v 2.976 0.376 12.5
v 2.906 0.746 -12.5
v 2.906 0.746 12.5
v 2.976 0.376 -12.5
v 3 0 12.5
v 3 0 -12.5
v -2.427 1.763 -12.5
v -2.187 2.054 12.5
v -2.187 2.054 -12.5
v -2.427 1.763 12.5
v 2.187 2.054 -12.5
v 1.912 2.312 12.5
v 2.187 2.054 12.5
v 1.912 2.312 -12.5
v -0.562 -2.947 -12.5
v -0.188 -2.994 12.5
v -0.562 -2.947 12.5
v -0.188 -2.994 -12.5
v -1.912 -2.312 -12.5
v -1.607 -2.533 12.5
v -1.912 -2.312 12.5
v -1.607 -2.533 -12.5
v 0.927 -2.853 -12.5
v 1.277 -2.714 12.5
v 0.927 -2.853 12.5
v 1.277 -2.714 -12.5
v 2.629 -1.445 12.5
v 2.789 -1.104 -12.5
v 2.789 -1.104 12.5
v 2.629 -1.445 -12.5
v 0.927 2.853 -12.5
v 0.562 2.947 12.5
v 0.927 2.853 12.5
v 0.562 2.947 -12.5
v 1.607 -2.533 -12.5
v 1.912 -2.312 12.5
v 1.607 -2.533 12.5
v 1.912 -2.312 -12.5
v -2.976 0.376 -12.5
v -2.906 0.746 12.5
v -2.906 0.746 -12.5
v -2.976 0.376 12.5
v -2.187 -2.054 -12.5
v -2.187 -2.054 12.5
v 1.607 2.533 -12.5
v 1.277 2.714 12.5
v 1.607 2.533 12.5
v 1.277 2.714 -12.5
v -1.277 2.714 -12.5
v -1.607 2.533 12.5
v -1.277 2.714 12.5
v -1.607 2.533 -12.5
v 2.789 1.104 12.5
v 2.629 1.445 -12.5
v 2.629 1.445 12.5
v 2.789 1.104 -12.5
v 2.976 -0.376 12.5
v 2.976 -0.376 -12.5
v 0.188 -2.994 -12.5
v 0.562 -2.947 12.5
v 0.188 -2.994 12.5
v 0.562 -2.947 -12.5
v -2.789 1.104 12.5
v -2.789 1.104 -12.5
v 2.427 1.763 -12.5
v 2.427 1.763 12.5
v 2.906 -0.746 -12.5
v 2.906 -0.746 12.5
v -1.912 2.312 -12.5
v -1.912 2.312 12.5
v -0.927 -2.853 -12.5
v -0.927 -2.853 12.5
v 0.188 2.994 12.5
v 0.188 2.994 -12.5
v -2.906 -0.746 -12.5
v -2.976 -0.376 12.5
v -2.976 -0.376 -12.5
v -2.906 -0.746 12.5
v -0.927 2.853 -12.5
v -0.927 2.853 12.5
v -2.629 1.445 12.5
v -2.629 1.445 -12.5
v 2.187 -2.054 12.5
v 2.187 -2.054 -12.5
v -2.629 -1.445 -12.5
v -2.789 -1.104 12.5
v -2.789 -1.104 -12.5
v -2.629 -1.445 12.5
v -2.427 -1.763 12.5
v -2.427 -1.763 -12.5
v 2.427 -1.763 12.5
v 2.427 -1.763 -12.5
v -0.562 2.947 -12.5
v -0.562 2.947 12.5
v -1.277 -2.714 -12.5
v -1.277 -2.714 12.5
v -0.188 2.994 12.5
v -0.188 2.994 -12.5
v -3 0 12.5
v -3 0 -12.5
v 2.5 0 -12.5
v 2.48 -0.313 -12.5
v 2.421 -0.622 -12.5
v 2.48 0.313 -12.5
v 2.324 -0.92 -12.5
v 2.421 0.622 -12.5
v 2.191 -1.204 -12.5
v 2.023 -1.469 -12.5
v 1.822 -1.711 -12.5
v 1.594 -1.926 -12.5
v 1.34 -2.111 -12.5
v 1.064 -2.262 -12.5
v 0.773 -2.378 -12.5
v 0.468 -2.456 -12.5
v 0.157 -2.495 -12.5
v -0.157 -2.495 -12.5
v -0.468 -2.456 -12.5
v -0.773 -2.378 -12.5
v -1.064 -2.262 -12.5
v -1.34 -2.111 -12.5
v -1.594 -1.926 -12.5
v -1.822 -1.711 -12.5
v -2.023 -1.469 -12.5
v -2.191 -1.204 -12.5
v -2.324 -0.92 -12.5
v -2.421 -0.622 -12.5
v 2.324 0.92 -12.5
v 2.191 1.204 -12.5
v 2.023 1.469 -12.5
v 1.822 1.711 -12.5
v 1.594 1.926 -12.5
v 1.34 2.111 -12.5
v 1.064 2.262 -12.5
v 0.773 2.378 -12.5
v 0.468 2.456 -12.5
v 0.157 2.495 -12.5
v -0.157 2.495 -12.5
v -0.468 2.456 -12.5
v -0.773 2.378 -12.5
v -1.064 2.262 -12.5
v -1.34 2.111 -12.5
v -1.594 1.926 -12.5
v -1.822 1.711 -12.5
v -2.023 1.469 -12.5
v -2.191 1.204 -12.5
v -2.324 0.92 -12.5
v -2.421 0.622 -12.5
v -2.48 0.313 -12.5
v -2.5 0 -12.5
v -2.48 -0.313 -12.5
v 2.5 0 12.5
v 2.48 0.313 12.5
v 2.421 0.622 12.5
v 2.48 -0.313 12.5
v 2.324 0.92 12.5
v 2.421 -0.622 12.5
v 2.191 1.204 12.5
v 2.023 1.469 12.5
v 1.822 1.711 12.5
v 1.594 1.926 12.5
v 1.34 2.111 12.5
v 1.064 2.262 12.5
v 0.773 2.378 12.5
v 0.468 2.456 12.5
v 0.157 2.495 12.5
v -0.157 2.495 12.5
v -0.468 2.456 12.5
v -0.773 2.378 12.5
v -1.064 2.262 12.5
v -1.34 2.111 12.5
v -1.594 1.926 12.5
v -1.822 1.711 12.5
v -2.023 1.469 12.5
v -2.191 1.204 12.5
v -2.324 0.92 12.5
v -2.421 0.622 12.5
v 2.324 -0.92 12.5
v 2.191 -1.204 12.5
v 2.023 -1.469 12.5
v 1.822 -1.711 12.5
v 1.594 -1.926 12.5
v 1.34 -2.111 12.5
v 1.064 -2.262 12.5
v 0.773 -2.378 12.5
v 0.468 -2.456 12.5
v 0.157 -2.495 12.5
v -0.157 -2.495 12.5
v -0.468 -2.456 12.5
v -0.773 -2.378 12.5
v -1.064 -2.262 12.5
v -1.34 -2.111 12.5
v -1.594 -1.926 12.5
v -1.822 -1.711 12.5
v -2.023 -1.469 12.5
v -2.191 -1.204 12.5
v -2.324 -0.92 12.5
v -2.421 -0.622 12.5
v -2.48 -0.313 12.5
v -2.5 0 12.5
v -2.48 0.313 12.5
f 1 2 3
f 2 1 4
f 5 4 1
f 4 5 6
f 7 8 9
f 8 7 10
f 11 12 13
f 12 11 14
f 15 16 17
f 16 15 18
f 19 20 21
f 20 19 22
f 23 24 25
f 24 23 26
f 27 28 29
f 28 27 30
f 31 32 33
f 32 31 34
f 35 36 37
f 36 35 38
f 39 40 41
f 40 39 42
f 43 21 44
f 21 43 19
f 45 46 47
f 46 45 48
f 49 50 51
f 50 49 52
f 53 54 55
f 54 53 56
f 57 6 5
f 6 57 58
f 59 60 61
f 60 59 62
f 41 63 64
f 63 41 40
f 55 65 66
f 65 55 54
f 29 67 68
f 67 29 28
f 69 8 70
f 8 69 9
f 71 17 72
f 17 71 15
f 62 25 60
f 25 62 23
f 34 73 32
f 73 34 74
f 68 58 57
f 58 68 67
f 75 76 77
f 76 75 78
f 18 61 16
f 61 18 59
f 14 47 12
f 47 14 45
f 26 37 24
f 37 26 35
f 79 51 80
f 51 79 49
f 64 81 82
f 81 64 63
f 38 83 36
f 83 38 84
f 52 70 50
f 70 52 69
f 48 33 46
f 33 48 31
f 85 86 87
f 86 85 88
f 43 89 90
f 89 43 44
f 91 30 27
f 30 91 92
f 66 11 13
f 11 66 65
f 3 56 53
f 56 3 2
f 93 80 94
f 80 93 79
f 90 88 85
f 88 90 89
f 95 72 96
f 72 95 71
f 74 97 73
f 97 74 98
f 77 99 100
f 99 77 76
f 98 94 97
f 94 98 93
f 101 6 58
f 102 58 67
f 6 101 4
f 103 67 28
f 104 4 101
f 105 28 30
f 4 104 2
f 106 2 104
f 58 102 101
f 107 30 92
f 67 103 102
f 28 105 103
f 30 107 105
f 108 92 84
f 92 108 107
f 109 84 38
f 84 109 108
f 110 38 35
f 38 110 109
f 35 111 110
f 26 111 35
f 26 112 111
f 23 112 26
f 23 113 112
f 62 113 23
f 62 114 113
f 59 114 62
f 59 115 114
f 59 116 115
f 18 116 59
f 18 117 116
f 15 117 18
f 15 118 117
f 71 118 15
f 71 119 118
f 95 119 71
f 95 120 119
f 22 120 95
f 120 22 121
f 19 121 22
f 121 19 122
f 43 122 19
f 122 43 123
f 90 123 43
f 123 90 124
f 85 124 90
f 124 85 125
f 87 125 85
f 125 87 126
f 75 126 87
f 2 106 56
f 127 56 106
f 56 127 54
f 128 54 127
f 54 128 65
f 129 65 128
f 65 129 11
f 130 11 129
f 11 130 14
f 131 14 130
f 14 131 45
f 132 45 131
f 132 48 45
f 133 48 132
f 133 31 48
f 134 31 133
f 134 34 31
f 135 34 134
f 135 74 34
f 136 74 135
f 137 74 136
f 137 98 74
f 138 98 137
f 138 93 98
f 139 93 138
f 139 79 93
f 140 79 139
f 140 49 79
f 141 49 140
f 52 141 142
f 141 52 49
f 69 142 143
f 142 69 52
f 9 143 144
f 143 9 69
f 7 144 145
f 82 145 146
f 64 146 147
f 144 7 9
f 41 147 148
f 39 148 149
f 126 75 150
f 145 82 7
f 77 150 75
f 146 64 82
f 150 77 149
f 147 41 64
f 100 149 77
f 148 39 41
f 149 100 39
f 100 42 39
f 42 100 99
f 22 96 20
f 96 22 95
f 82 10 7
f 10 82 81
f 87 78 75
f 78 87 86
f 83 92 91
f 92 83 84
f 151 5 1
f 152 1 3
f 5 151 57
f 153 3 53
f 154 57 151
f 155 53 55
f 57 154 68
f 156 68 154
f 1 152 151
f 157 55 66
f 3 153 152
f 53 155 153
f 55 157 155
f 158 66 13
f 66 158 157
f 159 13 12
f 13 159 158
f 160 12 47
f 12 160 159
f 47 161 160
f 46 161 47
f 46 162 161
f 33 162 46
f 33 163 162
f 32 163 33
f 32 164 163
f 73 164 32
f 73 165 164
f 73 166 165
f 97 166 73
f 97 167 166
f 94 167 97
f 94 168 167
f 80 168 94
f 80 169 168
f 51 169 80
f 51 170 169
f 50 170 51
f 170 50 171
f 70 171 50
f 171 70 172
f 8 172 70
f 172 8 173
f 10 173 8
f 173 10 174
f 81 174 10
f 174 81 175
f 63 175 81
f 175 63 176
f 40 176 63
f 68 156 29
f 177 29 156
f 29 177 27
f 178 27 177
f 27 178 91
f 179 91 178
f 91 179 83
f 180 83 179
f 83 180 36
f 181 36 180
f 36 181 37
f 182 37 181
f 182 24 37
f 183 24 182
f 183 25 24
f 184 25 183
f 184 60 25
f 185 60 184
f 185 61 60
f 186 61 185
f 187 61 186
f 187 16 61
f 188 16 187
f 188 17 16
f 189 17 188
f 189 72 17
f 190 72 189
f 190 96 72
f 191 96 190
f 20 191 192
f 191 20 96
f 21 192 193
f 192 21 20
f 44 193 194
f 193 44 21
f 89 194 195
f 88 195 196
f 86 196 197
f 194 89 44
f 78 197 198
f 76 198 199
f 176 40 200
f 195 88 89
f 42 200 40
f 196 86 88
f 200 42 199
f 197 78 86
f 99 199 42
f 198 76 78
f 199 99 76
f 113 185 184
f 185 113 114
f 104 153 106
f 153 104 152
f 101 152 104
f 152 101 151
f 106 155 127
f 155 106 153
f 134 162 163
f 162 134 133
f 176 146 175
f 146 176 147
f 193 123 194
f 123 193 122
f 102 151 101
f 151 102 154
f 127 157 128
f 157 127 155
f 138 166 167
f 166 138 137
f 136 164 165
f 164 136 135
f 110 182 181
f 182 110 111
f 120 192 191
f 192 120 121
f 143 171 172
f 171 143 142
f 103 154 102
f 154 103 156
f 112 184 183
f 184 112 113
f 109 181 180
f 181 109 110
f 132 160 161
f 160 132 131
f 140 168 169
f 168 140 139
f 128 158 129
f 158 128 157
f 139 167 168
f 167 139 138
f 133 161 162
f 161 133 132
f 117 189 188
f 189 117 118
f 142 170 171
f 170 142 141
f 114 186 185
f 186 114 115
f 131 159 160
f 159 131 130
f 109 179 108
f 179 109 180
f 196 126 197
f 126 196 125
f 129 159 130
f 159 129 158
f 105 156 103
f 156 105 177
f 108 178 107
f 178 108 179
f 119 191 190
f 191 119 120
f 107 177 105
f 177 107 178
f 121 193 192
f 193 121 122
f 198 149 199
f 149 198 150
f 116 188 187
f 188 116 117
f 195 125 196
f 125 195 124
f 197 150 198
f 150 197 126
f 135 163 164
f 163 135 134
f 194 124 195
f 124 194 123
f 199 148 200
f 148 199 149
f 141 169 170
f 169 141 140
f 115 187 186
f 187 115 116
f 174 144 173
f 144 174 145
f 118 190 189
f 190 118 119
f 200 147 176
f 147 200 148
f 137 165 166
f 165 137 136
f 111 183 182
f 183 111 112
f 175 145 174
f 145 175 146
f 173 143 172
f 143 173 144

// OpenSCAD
$fn = 50;


difference() {
	union() {
		translate(v = [0, 0, -12.5000000000]) {
			cylinder(h = 25, r = 3.0000000000);
		}
	}
	union() {
		translate(v = [0, 0, -100.0000000000]) {
			cylinder(h = 200, r = 2.5000000000);
		}
	}
}
